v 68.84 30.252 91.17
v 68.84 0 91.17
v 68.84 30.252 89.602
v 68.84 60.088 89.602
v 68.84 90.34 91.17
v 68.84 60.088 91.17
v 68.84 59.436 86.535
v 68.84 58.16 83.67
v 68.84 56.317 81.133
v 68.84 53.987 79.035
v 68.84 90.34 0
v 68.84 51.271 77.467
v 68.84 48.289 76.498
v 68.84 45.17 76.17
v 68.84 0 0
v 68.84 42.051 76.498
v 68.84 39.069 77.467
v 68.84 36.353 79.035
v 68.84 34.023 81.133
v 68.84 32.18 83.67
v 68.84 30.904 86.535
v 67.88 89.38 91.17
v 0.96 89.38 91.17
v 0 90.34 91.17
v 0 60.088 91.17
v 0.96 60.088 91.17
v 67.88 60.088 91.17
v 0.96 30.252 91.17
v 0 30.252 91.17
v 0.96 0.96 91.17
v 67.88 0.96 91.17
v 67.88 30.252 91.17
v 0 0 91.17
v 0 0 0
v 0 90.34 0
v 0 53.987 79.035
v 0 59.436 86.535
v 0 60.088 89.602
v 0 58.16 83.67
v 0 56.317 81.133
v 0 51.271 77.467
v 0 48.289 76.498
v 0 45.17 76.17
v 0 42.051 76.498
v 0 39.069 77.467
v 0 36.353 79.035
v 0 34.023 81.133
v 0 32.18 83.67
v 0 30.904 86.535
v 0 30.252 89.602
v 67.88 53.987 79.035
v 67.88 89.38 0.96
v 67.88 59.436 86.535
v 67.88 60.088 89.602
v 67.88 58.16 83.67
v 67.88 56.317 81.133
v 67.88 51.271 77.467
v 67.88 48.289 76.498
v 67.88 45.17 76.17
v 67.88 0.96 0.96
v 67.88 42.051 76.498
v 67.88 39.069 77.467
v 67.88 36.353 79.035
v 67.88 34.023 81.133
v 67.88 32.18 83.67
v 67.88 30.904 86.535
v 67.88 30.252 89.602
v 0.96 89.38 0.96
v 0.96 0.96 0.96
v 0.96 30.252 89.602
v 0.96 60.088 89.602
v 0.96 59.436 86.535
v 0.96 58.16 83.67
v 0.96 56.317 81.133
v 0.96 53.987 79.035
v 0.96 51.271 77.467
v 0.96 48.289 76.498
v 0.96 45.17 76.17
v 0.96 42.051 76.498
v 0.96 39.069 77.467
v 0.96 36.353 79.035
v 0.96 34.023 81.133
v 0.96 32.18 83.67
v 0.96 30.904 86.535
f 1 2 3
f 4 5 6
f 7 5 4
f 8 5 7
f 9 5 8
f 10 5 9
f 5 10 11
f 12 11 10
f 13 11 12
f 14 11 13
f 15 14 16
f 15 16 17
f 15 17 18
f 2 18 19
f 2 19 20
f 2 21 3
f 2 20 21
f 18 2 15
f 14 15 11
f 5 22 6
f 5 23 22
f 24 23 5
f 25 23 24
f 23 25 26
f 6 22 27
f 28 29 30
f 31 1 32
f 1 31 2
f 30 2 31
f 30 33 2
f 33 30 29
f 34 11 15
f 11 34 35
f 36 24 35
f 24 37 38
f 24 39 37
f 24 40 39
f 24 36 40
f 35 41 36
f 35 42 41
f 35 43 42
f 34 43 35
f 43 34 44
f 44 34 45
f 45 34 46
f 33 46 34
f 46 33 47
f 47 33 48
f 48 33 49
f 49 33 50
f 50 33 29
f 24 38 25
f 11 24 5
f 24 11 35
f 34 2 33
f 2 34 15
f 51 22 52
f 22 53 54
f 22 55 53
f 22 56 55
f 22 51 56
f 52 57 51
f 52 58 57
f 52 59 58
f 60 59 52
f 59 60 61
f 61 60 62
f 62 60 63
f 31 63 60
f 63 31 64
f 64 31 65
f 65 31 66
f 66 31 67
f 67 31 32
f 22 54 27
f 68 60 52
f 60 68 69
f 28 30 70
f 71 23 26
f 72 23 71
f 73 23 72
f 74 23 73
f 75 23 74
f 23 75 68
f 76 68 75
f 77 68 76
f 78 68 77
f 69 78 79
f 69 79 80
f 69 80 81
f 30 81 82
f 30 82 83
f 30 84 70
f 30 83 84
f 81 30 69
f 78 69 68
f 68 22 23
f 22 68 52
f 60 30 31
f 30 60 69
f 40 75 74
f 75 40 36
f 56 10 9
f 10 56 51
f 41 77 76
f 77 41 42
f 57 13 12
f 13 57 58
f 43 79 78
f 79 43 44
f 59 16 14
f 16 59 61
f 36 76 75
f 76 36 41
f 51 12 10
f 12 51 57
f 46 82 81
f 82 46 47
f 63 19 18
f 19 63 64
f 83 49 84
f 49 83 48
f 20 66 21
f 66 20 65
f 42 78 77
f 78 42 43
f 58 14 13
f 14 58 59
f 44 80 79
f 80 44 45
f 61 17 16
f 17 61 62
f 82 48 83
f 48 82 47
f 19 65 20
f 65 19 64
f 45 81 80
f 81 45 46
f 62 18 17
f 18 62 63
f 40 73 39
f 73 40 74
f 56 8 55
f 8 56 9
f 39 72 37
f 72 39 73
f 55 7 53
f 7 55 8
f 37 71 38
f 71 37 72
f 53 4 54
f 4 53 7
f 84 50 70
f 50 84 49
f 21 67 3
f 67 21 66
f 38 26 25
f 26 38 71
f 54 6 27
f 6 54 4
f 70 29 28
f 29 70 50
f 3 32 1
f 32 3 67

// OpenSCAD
cardWidth=63.5;
cardHeight=88.5;
cardThickness=0.34;

cardPerBox=250;
cardBlockLength=cardThickness*cardPerBox;

spaceAroundCard=0.25;
spaceAroundLid=0.5;

wallthickness=0.96;

fingerCutout=30;

// 1 for base box, 0 for lid, 2 for Logo only
boxOrLidOrLogo=0;

// logo filename
logoFile=""; //No Logo

/*
logoFile="pokemon-unbroken-bonds-set-symbol-150x150.dxf"; //Unbroken Bonds	2019
logoFile="detective-pikachu-set-symbol-150x147.dxf"; //Detective Pikachu	2019
logoFile="pokemon-team-up-set-symbol-150x150.dxf"; //Team Up	2019
logoFile="sm-lost-thunder-set-symbol-145x150.dxf"; //Lost Thunder	2018
logoFile="dragon-majesty-pokemon-set-symbol-150x150.dxf"; //Dragon Majesty	2018
logoFile="sun-and-moon-celestial-storm-pokemon-set-symbol-150x150.dxf"; //Celestial Storm	2018
logoFile="sun-and-moon-forbidden-light-pokemon-set-symbol-150x150.dxf"; //Forbidden Light	2018
logoFile="sun-and-moon-ultra-prism-pokemon-set-symbol-1-150x150.dxf"; //Ultra Prism	2018
logoFile="sun-and-moon-crimson-invasion-pokemon-set-symbol-150x150.dxf"; //Crimson Invasion	2017
logoFile="shining-legends-pokemon-set-symbol-150x150.dxf"; //Shining Legends	2017
logoFile="sun-and-moon-burning-shadows-set-symbol-150x150.dxf"; //Burning Shadows	2017
logoFile="sun-and-moon-guardians-rising-pokemon-set-symbol-150x150.dxf"; //Guardians Rising	2017
logoFile="sun-and-moon-pokemon-set-symbol-150x150.dxf"; //Sun & Moon	2017
logoFile="xy-promos-pokemon-set-symbol-150x136.dxf"; //Sun & Moon Promos	2016
logoFile="xy-evolutions-pokemon-set-symbol-150x150.dxf"; //Evolutions	2016
logoFile="xy-steam-siege-pokemon-set-symbol-150x150.dxf"; //Steam Siege	2016
logoFile="xy-fates-collide-pokemon-set-symbol-150x150.dxf"; //Fates Collide	2016
logoFile="generations-pokemon-set-symbol-150x150.dxf"; //Generations	2016
logoFile="xy-BREAKpoint-pokemon-set-symbol-150x150.dxf"; //BREAKpoint	2016
logoFile="xy-BREAKthrough-pokemon-set-symbol-150x150.dxf"; //BREAKthrough	2015
logoFile="xy-ancient-origins-pokemon-set-symbol-150x150.dxf"; //Ancient Origins	2015
logoFile="xy-roaring-skies-pokemon-set-symbol-150x150.dxf"; //Roaring Skies	2015
logoFile="xy-double-crisis-pokemon-set-symbol.png-150x150.dxf"; //Double Crisis	2015
logoFile="xy-primal-clash-pokemon-set-symbol-150x150.dxf"; //Primal Clash	2015
logoFile="xy-phantom-forces-pokemon-set-symbol-150x150.dxf"; //Phantom Forces	2014
logoFile="xy-furious-fists-pokemon-set-symbol-150x150.dxf"; //Furious Fists	2014
logoFile="xy-flashfire-pokemon-set-symbol-150x150.dxf"; //Flashfire	2014
logoFile="xy-pokemon-set-symbol-150x150.dxf"; //XY	2014
logoFile="xy-kalos-starter-pokemon-set-symbol-150x150.dxf"; //Kalos Starter Set	2013
logoFile="xy-promos-pokemon-set-symbol-150x136.dxf"; //XY - Promos	2013
logoFile="black-and-white-legendary-treasures-pokemon-set-symbol-150x150.dxf"; //Legendary Treasures	2013
logoFile="black-and-white-plasma-blast-pokemon-set-symbol-150x150.dxf"; //Plasma Blast	2013
logoFile="black-and-white-plasma-freeze-pokemon-set-symbol-150x150.dxf"; //Plasma Freeze	2013
logoFile="black-and-white-plasma-storm-pokemon-set-symbol-150x150.dxf"; //Plasma Storm	2013
logoFile="black-and-white-boundaries-crossed-pokemon-set-symbol-150x150.dxf"; //Boundaries Crossed	2012
logoFile="black-and-white-dragon-vault-pokemon-set-symbol-150x150.dxf"; //Dragon Vault	2012
logoFile="black-and-white-dragons-exalted-pokemon-set-symbol-150x150.dxf"; //Dragons Exalted	2012
logoFile="black-and-white-dark-explorers-pokemon-set-symbol-150x150.dxf"; //Dark Explorers	2012
logoFile="black-and-white-next-destinies-pokemon-set-symbol-150x150.dxf"; //Next Destinies	2012
logoFile="black-and-white-noble-victories-pokemon-set-symbol-150x150.dxf"; //Noble Victories	2011
logoFile="black-and-white-emerging-powers-pokemon-set-symbol-150x150.dxf"; //Emerging Powers	2011
logoFile="black-and-white-pokemon-set-symbol-150x150.dxf"; //Black and White Base Set	2011
logoFile="call-of-legends-pokemon-set-symbol-150x150.dxf"; //Call of Legends	2011
logoFile="heartgold-and-soulsilver-triumphant-pokemon-set-symbol-150x150.dxf"; //Triumphant	2010
logoFile="heartgold-and-soulsilver-undaunted-pokemon-set-symbol-150x150.dxf"; //Undaunted	2010
logoFile="heartgold-and-soulsilver-unleashed-pokemon-set-symbol-150x150.dxf"; //Unleashed	2010
logoFile="heartGold-and-soulSilver-pokemon-set-symbol-150x150.dxf"; //HeartGold and SoulSilver	2010
logoFile="heartgold-soulsilver-promos-pokemon-set-symbol-150x136.dxf"; //HeartGold and SoulSilver Promos	2010
logoFile="arceus-pokemon-set-symbol-150x150.dxf"; //Arceus	2009
logoFile="supreme-victors-pokemon-set-symbol-150x150.dxf"; //Supreme Victors	2009
logoFile="rising-rivals-pokemon-set-symbol-150x150.dxf"; //Rising Rivals	2009
logoFile="pokemon-pop-series-9-set-symbol-150x92.dxf"; //POP Series 9	2009
logoFile="platinum-base-set-pokemon-set-symbol-150x150.dxf"; //Platinum Base Set	2009
logoFile="pokemon-pop-series-8-set-symbol-150x91.dxf"; //POP Series 8	2008 - 2009
logoFile="stormfront-pokemon-set-symbol-150x150.dxf"; //Stormfront	2008
logoFile="legends-awakened-pokemon-set-symbol-150x150.dxf"; //Legends Awakened	2008
logoFile="majestic-dawn-pokemon-set-symbol-150x150.dxf"; //Majestic Dawn	2008
logoFile="pokemon-pop-series-7-set-symbol-150x95.dxf"; //POP Series 7	2008
logoFile="great-encounters-pokemon-set-symbol-150x150.dxf"; //Great Encounters	2008	
logoFile="secret-wonders-pokemon-set-symbol-150x150.dxf"; //Secret Wonders	2007
logoFile="pokemon-pop-series-6-set-symbol-150x91.dxf"; //POP Series 6	2007 - 2008
logoFile="mysterious-treasures-pokemon-set-symbol-150x150.dxf"; //Mysterious Treasures	2007
logoFile="diamond-and-pearl-pokemon-set-symbol-150x150.dxf"; //Diamond & Pearl	2007
logoFile="diamond-pearl-promos-pokemon-set-symbol-150x136.dxf"; //Diamond & Pearl Promos	2007
logoFile="pokemon-pop-series-5-set-symbol-150x97.dxf"; //POP Series 5	2007
logoFile="ex-power-keepers-pokemon-set-symbol-150x150.dxf"; //Power Keepers	2007
logoFile="ex-dragon-frontiers-pokemon-set-symbol-150x150.dxf"; //Dragon Frontiers	2006
logoFile="ex-crystal-guardians-pokemon-set-symbol-150x150.dxf"; //Crystal Guardians	2006
logoFile="pokemon-pop-series-4-set-symbol-150x92.dxf"; //POP Series 4	2006 - 2007
logoFile="ex-holon-phantoms-pokemon-set-symbol-150x150.dxf"; //Holon Phantoms	2006
logoFile="pokemon-pop-series-3-set-symbol-150x94.dxf"; //POP Series 3	2006
logoFile="ex-trainer-kit-2-minun-pokemon-set-symbol-115x150.dxf"; //EX Trainer Kit 2	2006
logoFile="ex-legend-maker-pokemon-set-symbol-150x150.dxf"; //Legend Maker	2006
logoFile="ex-delta-species-pokemon-set-symbol-150x150.dxf"; //Delta Species	2005
logoFile="ex-unseen-forces-pokemon-set-symbol-150x150.dxf"; //Unseen Forces	2005
logoFile="pokemon-pop-series-2-set-symbol-150x94.dxf"; //POP Series 2	2005 - 2006
logoFile="ex-emerald-pokemon-set-symbol-150x150.dxf"; //Emerald	2005
logoFile="ex-deoxys-pokemon-set-symbol-150x150.dxf"; //Deoxys	2005
logoFile="ex-team-rocket-returns-pokemon-set-symbol.dxf"; //Team Rocket Returns	2004
logoFile="pokemon-pop-series-1-set-symbol-150x100.dxf"; //POP Series 1	2004 - 2005
logoFile="ex-fire-red-and-leaf-green-pokemon-set-symbol.dxf"; //Fire Red and Leaf Green	2004
logoFile="ex-hidden-legends-pokemon-set-symbol.dxf"; //Hidden Legends	2004
logoFile="pokemon-ex-trainer-kit-latias-set-symbol-150x101.dxf"; //EX Trainer Kit	2004
logoFile="ex-team-magma-vs-team-aqua-pokemon-set-symbol.dxf"; //Team Magma vs Team Aqua	2004
logoFile="ex-dragon-pokemon-set-symbol.dxf"; //Dragon	2003
logoFile="ex-sandstorm-pokemon-set-symbol.dxf"; //Sandstorm	2003
logoFile="ex-ruby-and-sapphire-pokemon-set-symbol.dxf"; //Ruby and Sapphire	2003
logoFile="skyridge-pokemon-set-symbol.dxf"; //Skyridge	2003
logoFile="pokemon-nintendo-black-star-promos-set-symbol-150x136.dxf"; //Nintendo Black Star Promos	2003 - 2006
logoFile="aquapolis-pokemon-set-symbol.dxf"; //Aquapolis	2003
logoFile="expedition-base-set-pokemon-set-symbol.dxf"; //Expedition	2002
logoFile="legendary-collection-pokemon-set-symbol.dxf"; //Legendary Collection	2002
logoFile="neo-destiny-pokemon-set-symbol.dxf"; //Neo Destiny	2002
logoFile="neo-revelation-pokemon-set-symbol-150x97.dxf"; //Neo Revelation	2001
logoFile="pokemon-southern-islands-set-symbol-150x118.dxf"; //Southern Islands	2001
logoFile="neo-discovery-pokemon-set-symbol.dxf"; //Neo Discovery	2001
logoFile="neo-genesis-pokemon-set-symbol.dxf"; //Neo Genesis	2000
logoFile="gym-challenge-pokemon-set-symbol-150x92.dxf"; //Gym Challenge	2000
logoFile="gym-heroes-pokemon-set-symbol-150x91.dxf"; //Gym Heroes	2000
logoFile="team-rocket-pokemon-set-symbol.dxf"; //Team Rocket	2000
logoFile="base-set-2-pokemon-set-symbol.dxf"; //Base Set 2	2000
logoFile="fossil-pokemon-set-symbol.dxf"; //Fossil	1999
logoFile="pokemon-wizards-black-star-promos-set-symbol-150x136.dxf"; //Wizards Black Star Promos	1999 - 2003
logoFile="jungle-pokemon-set-symbol.dxf"; //Jungle	1999
logoFile=".dxf"; //Base Set	1999
logoFile="mcdonalds-pokemon-2018-set-symbol-150x140.dxf"; //McDonald’s 2018	2018
logoFile="mcdonalds-pokemon-2017-set-symbol-150x150.dxf"; //McDonald’s 2017	2017
logoFile="mcdonalds-pokemon-2016-set-symbol-150x140.dxf"; //McDonald’s 2016	2016
logoFile="mcdonalds-pokemon-2015-set-symbol-148x150.dxf"; //McDonald’s 2015	2015
logoFile="mcdonalds-pokemon-2014-set-symbol-150x148.dxf"; //McDonald’s 2014	2014
logoFile="mcdonalds-pokemon-2013-set-symbol.dxf"; //McDonald’s 2013	2013
logoFile="mcdonalds-pokemon-2012-set-symbol-150x150.dxf"; //McDonald’s 2012	2012
logoFile="mcdonalds-pokemon-2011-set-symbol-150x130.dxf"; //McDonald’s 2011	2011
*/


if (boxOrLidOrLogo==0) {
   mainLid();
}
if (boxOrLidOrLogo==1) {
   mainBox();
}
if (boxOrLidOrLogo==2) {
   Logo();
}

module mainBox () {
    difference() {
        Box();
        translate([
            (cardWidth+(spaceAroundCard*2)+(wallthickness*2))/2,
            cardBlockLength+(spaceAroundCard*2)+(wallthickness*3),
            cardHeight+spaceAroundCard+wallthickness
            ]){
            rotate(a=[90,0,0]){
                cylinder(h=(cardBlockLength+(spaceAroundCard*2)+(wallthickness*4)),d=fingerCutout);
            }
        }
    }
}


module Box () {
    difference() {
        cube([
        cardWidth+(spaceAroundCard*2)+(wallthickness*2),
        cardBlockLength+(spaceAroundCard*2)+(wallthickness*2),
        cardHeight+spaceAroundCard+wallthickness
        ]);
        translate([wallthickness,wallthickness,wallthickness]) {
            cube([
            cardWidth+(spaceAroundCard*2),
            cardBlockLength+(spaceAroundCard*2),
            cardHeight+spaceAroundCard+wallthickness
            ]);
        }
    }
}

module mainLid () {
    difference() {
        LidBox();
        translate([
            -spaceAroundLid,
            (cardBlockLength+(spaceAroundCard*2)+(wallthickness*4)+(spaceAroundLid*2))/2,
            cardHeight+spaceAroundCard+(wallthickness*2)+(spaceAroundLid)
            ]){
            rotate(a=[0,90,0]){
                cylinder(h=cardWidth+(spaceAroundCard*2)+(wallthickness*4)+(spaceAroundLid*4),d=fingerCutout);
            }
        }
        if (logoFile) Logo();
    }
}


module LidBox () {
    difference() {
        cube([
        cardWidth+(spaceAroundCard*2)+(wallthickness*4)+(spaceAroundLid*2),
        cardBlockLength+(spaceAroundCard*2)+(wallthickness*4)+(spaceAroundLid*2),
        cardHeight+spaceAroundCard+(wallthickness*2)+(spaceAroundLid)
        ]);
        translate([wallthickness,wallthickness,wallthickness]) {
            cube([
            cardWidth+(spaceAroundCard*2)+(wallthickness*2)+(spaceAroundLid*2),
            cardBlockLength+(spaceAroundCard*2)+(wallthickness*2)+(spaceAroundLid*2),
            cardHeight+spaceAroundCard+(wallthickness*2)+(spaceAroundLid)
            ]);
        }
    }
}

module Logo () {
        
    boxwidth=cardWidth+(spaceAroundCard*2)+(wallthickness*4)+(spaceAroundLid*2);
    translate([((boxwidth/2)/2)+(boxwidth/2),wallthickness/2,boxwidth/1.5]) {
        rotate(a=[90,180,0]){
            resize([boxwidth/2,boxwidth/2,wallthickness/2]) {
                linear_extrude(height = 4) import(logoFile);
            }
        }
    }
     
    
    
}
